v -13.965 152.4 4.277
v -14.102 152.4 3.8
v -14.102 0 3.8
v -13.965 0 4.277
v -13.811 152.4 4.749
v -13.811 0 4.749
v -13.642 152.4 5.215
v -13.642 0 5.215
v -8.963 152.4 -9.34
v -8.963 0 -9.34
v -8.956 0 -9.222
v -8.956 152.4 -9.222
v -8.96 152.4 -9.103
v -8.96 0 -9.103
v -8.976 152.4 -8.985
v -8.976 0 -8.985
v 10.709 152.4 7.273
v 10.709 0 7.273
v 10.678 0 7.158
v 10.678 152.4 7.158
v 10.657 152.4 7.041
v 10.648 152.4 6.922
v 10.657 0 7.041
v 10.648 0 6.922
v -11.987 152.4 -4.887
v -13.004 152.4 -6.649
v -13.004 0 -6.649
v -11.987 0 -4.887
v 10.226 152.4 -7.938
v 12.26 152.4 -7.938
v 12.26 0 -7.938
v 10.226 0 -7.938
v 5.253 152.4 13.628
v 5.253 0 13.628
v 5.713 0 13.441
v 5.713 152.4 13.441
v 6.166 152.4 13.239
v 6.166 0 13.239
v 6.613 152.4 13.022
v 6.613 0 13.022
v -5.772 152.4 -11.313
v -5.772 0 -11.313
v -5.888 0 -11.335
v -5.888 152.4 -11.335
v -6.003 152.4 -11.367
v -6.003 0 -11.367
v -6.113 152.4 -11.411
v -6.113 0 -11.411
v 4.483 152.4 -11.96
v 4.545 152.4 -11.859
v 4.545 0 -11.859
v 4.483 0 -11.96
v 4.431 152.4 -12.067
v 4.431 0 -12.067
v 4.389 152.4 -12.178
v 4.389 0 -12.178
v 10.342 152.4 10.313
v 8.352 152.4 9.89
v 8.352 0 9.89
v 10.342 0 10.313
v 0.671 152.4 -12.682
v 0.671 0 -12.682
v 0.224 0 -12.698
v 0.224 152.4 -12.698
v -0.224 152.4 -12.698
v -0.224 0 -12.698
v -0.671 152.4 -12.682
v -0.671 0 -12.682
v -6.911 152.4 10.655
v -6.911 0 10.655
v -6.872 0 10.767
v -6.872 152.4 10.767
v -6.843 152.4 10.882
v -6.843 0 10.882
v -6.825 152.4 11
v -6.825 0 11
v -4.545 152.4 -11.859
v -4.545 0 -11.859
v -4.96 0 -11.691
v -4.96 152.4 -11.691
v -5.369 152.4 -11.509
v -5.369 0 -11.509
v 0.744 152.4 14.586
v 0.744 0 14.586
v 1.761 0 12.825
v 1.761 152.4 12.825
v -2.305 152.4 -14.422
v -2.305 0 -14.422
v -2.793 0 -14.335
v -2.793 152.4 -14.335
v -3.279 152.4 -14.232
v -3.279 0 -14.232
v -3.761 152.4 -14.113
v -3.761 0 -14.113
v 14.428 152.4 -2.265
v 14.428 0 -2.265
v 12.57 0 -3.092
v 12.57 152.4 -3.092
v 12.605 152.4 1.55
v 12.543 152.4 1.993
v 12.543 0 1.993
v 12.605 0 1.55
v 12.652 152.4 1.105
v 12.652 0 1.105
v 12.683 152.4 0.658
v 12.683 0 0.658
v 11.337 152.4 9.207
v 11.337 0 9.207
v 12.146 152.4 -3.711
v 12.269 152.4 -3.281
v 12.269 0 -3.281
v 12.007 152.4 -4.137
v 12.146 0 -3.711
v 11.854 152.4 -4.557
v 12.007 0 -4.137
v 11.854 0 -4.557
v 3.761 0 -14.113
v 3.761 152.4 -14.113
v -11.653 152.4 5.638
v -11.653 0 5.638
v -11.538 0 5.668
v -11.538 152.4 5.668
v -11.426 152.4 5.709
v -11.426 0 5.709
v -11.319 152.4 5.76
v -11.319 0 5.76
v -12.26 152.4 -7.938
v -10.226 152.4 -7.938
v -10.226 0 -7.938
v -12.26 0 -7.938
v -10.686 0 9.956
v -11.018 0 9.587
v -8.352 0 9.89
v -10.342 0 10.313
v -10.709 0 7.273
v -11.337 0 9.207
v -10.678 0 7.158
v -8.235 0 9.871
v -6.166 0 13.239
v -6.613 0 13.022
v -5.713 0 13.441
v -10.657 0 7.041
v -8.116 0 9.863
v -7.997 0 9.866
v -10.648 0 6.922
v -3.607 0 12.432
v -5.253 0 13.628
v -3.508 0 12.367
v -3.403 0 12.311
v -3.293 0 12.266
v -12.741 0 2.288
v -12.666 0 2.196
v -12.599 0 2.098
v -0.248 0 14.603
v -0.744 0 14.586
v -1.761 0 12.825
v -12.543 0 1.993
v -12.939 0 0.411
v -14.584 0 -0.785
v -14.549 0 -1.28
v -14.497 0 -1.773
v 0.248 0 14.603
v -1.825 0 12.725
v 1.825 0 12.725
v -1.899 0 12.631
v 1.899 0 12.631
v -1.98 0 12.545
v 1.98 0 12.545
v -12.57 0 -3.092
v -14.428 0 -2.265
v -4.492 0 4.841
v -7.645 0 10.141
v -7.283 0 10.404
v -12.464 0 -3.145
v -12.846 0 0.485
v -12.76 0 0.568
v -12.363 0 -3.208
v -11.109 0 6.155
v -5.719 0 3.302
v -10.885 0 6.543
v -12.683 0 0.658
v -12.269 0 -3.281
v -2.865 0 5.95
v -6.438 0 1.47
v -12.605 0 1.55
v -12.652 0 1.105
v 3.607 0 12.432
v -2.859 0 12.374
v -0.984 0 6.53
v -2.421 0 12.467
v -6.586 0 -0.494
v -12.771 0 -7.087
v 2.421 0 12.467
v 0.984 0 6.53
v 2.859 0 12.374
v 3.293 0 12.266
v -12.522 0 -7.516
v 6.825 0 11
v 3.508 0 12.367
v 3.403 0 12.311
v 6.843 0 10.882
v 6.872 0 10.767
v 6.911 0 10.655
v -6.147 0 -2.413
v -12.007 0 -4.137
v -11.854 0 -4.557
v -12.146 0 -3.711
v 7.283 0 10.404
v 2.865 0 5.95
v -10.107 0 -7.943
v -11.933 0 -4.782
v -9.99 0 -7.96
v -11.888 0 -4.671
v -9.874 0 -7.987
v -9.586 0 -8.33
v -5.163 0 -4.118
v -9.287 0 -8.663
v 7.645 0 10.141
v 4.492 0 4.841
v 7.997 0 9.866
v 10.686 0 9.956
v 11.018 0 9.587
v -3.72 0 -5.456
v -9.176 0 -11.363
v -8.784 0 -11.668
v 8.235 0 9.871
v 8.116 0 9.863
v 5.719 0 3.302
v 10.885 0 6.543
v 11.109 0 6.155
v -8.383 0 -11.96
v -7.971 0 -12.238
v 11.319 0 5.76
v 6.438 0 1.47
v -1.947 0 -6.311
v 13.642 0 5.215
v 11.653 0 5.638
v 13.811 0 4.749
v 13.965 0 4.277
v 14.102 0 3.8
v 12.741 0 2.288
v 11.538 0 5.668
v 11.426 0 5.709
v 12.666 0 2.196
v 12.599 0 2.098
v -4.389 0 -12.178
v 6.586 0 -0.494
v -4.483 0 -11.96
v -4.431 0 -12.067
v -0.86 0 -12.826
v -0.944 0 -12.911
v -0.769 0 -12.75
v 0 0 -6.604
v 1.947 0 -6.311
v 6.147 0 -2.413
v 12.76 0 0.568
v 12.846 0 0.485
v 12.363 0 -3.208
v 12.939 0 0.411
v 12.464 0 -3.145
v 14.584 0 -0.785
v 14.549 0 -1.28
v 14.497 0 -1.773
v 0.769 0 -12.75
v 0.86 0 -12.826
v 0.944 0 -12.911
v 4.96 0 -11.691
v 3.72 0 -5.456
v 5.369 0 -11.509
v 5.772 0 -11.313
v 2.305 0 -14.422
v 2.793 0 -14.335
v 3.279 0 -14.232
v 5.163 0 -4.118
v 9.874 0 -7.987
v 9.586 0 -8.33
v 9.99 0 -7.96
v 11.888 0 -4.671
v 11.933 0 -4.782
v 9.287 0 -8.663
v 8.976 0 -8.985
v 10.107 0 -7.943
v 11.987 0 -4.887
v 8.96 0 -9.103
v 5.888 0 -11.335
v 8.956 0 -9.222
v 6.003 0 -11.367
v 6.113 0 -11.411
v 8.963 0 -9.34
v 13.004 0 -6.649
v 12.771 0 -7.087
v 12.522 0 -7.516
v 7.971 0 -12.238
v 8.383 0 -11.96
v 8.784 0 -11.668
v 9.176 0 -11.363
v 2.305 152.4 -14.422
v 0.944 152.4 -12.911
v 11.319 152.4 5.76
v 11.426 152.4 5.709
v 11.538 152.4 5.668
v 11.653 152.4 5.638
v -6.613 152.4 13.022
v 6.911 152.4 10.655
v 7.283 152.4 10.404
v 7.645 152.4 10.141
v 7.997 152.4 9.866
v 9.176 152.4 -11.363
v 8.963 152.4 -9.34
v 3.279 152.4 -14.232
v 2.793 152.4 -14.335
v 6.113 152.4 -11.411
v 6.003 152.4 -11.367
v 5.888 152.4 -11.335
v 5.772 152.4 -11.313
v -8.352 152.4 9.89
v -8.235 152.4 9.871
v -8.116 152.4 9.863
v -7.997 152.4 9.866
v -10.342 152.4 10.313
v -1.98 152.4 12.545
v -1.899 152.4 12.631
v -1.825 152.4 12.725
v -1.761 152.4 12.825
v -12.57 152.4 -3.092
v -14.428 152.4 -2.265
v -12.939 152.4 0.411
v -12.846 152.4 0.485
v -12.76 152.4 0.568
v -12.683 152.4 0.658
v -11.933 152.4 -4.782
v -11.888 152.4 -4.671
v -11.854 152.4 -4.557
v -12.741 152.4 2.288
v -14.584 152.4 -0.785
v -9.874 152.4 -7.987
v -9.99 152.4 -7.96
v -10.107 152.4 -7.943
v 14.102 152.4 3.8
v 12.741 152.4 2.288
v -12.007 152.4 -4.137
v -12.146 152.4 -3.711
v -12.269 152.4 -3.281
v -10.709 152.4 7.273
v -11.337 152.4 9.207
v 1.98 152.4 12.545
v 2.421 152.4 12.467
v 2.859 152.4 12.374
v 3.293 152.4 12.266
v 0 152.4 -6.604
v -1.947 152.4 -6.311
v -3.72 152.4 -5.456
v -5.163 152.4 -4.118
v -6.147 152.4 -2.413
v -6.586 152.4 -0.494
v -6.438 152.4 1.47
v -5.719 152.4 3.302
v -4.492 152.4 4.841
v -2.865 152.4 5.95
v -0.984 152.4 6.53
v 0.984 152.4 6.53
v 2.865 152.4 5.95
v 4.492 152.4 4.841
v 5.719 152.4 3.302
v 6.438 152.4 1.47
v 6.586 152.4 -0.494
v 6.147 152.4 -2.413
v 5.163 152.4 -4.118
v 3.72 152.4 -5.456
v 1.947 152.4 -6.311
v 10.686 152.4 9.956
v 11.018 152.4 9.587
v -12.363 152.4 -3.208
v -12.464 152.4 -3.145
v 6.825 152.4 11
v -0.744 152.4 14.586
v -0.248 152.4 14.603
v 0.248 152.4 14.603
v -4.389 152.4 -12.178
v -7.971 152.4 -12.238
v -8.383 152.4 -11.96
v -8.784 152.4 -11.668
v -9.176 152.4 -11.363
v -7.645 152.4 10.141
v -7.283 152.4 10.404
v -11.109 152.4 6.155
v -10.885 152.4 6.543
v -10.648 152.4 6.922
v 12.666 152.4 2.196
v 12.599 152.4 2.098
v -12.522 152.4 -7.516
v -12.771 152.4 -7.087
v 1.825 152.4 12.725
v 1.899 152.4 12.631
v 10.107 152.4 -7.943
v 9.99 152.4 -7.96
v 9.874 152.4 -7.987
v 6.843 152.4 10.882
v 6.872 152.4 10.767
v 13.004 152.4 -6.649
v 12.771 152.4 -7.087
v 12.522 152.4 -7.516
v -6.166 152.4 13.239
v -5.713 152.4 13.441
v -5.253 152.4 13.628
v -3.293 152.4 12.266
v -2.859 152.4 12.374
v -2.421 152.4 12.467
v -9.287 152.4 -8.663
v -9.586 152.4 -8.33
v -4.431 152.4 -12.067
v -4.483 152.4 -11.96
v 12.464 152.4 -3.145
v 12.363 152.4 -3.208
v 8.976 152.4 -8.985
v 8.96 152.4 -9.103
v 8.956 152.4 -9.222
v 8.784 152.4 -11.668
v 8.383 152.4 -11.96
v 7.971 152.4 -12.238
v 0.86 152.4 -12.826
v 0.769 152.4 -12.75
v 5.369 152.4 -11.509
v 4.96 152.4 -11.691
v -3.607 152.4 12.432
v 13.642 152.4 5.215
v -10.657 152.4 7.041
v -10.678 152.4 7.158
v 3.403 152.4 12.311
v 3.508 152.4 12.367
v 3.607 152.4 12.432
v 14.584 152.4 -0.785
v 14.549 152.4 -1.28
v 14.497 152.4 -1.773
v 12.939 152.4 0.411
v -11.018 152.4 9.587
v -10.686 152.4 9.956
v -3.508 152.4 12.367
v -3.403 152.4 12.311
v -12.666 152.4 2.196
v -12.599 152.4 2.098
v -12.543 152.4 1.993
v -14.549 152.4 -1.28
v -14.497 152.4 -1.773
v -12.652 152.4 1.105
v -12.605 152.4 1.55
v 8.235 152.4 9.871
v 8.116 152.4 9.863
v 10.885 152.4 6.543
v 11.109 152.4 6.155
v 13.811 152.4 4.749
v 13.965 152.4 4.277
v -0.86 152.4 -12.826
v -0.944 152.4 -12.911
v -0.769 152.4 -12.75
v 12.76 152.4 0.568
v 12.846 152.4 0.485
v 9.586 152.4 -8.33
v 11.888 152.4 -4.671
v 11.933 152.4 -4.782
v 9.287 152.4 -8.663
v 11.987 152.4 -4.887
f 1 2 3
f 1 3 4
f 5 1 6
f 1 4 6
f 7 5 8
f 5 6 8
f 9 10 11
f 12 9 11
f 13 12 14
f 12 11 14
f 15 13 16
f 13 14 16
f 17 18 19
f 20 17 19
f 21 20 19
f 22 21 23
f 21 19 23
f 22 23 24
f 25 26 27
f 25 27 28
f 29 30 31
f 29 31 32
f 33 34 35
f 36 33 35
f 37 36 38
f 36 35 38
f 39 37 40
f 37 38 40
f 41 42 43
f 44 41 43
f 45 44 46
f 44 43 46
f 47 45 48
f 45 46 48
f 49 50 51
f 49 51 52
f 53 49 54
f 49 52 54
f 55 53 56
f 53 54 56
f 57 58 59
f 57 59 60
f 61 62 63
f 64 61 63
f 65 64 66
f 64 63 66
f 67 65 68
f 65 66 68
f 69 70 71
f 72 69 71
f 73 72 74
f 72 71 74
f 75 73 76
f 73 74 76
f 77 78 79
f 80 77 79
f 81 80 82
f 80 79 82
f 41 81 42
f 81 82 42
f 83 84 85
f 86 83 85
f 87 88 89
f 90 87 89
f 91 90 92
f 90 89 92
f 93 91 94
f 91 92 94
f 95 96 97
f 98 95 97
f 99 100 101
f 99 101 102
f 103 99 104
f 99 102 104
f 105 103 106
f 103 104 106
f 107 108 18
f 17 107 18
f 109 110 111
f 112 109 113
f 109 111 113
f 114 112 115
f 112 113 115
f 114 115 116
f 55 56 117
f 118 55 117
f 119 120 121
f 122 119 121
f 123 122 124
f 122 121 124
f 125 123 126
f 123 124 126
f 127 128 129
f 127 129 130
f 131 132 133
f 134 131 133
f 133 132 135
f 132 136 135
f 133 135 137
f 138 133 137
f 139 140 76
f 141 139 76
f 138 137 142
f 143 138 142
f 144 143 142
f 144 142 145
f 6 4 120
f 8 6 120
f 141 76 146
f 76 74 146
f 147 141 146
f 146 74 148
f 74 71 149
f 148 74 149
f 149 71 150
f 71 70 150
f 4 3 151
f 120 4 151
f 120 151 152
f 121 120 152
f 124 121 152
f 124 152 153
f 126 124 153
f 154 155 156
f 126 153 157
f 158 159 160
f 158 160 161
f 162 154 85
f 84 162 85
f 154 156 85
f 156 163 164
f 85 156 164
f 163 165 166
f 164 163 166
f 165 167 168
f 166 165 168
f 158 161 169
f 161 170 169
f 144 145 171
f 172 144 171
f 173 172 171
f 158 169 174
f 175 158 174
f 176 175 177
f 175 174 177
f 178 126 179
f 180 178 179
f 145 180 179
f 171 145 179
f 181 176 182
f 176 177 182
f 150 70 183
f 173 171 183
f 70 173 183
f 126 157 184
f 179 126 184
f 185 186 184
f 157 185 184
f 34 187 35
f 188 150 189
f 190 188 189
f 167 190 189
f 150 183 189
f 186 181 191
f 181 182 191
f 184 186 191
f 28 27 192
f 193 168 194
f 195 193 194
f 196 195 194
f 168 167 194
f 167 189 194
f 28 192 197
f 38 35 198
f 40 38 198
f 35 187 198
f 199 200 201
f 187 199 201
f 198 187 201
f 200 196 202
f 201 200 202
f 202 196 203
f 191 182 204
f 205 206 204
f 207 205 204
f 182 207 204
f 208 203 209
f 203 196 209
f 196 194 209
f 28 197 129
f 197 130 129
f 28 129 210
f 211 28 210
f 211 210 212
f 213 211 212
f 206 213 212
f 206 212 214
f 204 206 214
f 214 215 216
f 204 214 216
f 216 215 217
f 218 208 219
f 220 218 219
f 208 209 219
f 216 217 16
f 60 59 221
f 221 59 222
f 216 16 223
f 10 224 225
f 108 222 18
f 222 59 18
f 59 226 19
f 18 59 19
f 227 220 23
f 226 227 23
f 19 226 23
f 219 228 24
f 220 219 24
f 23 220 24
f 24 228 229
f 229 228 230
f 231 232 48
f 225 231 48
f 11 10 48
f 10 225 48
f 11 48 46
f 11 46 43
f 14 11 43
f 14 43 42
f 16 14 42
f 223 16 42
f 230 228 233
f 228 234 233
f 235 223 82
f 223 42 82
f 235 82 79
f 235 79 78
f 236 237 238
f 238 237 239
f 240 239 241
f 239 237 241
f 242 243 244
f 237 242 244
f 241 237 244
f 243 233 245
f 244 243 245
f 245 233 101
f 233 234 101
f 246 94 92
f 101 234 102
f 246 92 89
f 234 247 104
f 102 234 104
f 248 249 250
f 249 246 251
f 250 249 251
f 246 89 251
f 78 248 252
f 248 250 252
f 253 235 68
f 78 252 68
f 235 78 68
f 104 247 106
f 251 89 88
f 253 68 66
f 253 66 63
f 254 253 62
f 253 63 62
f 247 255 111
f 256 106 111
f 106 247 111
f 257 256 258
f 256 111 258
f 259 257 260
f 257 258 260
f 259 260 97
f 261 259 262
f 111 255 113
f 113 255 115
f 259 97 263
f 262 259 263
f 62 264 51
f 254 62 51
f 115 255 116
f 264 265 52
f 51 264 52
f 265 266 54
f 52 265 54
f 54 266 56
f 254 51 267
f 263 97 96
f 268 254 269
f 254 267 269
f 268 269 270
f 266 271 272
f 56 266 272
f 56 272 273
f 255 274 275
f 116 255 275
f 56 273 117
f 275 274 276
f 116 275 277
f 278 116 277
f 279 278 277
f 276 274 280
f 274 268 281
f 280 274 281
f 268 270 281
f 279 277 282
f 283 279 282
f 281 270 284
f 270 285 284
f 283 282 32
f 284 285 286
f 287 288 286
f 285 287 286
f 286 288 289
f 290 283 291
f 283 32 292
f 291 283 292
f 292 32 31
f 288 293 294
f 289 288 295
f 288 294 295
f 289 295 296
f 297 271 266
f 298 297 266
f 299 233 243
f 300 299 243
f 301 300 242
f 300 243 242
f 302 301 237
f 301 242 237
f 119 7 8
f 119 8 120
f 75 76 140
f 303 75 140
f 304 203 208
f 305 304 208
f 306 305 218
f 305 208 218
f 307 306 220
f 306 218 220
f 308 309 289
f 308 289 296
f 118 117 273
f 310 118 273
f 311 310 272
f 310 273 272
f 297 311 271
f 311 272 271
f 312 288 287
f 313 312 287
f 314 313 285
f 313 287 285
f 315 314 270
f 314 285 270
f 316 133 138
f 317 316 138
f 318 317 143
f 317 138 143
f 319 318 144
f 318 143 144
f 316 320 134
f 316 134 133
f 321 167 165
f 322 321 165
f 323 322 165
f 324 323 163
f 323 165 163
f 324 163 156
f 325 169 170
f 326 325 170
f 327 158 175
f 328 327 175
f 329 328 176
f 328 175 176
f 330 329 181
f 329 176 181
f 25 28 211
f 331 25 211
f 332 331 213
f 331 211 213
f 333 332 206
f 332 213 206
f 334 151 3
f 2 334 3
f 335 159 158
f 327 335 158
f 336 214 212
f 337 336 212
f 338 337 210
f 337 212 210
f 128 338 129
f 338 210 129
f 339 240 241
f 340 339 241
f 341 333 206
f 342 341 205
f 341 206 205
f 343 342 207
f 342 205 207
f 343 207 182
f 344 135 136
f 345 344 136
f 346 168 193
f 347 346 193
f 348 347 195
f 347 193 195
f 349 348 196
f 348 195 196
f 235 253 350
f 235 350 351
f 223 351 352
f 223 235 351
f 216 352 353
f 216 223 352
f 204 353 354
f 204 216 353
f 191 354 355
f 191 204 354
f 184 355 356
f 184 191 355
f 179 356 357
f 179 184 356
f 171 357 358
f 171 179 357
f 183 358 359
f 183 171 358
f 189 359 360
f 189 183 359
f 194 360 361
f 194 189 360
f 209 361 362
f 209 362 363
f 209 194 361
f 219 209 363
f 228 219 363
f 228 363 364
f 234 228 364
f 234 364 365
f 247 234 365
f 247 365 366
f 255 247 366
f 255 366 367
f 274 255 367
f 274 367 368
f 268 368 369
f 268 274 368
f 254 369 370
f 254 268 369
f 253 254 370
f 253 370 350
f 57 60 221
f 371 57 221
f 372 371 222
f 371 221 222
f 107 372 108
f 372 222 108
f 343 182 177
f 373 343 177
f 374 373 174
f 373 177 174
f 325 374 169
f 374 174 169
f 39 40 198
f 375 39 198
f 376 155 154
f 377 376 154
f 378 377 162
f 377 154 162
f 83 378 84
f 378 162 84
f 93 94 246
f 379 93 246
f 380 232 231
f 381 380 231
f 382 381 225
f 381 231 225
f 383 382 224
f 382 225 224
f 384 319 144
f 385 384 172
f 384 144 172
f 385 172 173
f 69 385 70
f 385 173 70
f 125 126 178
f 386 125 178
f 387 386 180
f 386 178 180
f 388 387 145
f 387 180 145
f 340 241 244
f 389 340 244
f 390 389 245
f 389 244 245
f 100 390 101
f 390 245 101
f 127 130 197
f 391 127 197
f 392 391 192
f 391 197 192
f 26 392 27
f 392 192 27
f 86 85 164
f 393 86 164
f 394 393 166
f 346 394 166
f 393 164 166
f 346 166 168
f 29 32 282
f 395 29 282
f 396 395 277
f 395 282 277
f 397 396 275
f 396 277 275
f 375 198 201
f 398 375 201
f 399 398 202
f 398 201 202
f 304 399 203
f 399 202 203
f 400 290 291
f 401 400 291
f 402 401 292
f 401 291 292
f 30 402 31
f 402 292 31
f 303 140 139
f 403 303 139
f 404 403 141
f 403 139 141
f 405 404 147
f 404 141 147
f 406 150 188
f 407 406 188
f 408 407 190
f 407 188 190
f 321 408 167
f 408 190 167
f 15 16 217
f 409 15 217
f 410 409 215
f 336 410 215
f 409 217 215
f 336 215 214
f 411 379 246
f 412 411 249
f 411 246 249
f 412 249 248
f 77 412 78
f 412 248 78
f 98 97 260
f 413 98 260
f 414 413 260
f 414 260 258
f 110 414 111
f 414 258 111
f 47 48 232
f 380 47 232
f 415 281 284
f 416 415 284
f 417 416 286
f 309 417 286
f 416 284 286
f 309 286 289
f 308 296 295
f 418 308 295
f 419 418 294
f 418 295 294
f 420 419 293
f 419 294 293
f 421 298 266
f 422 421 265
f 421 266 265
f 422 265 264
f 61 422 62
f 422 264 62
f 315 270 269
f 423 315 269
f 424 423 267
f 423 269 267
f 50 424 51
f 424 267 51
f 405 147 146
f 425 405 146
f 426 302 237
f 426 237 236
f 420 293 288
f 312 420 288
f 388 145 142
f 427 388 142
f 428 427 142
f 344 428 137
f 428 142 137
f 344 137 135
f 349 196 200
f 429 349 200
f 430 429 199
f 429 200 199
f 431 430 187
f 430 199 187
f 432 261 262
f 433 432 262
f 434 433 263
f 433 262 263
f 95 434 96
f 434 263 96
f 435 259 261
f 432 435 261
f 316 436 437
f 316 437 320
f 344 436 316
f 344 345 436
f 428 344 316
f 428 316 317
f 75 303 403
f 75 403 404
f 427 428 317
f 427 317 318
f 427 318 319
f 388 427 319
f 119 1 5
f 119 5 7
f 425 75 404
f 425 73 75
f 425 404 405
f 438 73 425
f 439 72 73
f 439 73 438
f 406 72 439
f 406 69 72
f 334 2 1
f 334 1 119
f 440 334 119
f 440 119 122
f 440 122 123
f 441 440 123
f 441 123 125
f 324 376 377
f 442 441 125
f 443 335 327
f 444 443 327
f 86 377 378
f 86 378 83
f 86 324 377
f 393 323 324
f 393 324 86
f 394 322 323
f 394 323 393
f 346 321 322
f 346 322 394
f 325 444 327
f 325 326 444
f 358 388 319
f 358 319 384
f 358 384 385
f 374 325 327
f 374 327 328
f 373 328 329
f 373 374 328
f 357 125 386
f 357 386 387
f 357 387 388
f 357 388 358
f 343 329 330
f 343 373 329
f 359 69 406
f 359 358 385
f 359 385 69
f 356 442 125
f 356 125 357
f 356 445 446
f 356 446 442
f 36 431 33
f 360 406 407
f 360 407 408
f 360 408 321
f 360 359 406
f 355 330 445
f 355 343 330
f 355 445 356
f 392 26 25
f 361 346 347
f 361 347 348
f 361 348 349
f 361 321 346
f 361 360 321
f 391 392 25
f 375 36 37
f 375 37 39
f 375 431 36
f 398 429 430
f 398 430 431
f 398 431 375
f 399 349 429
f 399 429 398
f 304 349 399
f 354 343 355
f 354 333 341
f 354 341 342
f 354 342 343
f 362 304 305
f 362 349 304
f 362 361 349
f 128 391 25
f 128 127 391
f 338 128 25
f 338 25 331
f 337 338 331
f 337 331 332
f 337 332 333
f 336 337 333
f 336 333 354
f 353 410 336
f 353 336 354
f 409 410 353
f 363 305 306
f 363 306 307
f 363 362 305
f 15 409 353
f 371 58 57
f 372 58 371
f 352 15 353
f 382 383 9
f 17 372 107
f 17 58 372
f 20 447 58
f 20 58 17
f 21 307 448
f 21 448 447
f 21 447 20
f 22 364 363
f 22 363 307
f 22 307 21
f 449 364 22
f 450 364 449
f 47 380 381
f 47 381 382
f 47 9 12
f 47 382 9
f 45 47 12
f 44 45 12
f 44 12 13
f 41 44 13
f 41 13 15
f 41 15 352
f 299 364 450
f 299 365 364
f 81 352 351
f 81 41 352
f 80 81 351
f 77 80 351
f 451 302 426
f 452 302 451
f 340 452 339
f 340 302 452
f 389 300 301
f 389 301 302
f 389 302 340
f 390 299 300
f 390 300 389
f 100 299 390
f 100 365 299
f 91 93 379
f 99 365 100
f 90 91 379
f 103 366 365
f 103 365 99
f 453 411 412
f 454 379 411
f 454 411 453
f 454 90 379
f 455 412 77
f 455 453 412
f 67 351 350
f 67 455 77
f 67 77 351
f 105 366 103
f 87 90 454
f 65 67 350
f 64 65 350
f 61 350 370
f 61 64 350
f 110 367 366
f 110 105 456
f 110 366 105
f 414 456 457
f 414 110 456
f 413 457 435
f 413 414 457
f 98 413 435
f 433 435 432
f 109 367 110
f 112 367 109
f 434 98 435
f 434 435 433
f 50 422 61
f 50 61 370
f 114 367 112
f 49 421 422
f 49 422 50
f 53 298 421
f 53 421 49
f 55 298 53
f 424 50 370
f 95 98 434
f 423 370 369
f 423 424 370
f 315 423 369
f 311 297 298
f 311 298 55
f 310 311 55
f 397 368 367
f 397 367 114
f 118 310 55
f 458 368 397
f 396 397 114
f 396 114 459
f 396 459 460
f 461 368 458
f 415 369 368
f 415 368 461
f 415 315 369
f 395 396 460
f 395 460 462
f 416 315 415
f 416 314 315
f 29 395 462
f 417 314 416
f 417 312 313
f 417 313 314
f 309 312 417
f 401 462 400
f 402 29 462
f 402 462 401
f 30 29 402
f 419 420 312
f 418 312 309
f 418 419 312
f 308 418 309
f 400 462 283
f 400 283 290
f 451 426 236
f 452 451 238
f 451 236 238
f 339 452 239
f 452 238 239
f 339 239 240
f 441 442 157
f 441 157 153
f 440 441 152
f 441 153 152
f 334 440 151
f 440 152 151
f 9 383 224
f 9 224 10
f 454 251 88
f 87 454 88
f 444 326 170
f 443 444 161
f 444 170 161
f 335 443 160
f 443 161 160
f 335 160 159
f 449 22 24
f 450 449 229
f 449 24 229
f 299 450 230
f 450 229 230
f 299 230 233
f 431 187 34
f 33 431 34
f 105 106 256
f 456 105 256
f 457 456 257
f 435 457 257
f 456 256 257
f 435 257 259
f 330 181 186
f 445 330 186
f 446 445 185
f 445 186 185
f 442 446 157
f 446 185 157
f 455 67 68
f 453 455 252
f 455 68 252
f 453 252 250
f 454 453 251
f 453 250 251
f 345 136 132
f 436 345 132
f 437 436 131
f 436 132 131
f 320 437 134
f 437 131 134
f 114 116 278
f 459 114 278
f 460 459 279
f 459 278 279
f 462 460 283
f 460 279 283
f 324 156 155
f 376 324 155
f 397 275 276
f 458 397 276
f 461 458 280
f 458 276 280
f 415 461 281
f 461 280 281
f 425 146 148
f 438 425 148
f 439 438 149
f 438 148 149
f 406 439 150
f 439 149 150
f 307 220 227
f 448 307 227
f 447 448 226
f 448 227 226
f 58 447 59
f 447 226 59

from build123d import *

# Parameters (mm, degrees)
SKETCH1_R           = 6.604
BOSS_EXTRUDE3_DEPTH = 152.4


with BuildPart() as part:
    # Sketch1 → Boss-Extrude3 (new body)
    with BuildSketch(Plane(origin=(0, 0, 0), x_dir=(1, 0, 0), z_dir=(0, 1, 0))):
        with BuildLine():
            Line((-1.761094277, -12.824695235), (-0.744188415, -14.586027856))
            ThreePointArc((-0.744188415, -14.586027856), (0, -14.605), (0.744188415, -14.586027856))
            Line((0.744188415, -14.586027856), (1.761094277, -12.824695235))
            ThreePointArc((1.761094277, -12.824695235), (1.86082516, -12.676971002), (1.980255064, -12.544663801))
            ThreePointArc((1.980255064, -12.544663801), (2.640478473, -12.422474529), (3.293321424, -12.26556293))
            ThreePointArc((3.293321424, -12.26556293), (3.456240258, -12.337855055), (3.607433811, -12.432243652))
            Line((3.607433811, -12.432243652), (5.25282206, -13.62768819))
            ThreePointArc((5.25282206, -13.62768819), (5.940388672, -13.342331409), (6.612521952, -13.022310795))
            Line((6.612521952, -13.022310795), (6.825113166, -10.999640503))
            ThreePointArc((6.825113166, -10.999640503), (6.856137002, -10.824123497), (6.911427462, -10.654678336))
            ThreePointArc((6.911427462, -10.654678336), (7.464872704, -10.274515829), (7.997452719, -9.8656348))
            ThreePointArc((7.997452719, -9.8656348), (8.175690336, -9.865411882), (8.35220382, -9.890144198))
            Line((8.35220382, -9.890144198), (10.34157188, -10.312997433))
            ThreePointArc((10.34157188, -10.312997433), (10.853630176, -9.772652506), (11.33749037, -9.206917894))
            Line((11.33749037, -9.206917894), (10.709007984, -7.272647999))
            ThreePointArc((10.709007984, -7.272647999), (10.66596047, -7.099686705), (10.647551263, -6.922402191))
            ThreePointArc((10.647551263, -6.922402191), (10.998522628, -6.35), (11.318751785, -5.759848786))
            ThreePointArc((11.318751785, -5.759848786), (11.481489281, -5.687149371), (11.652801912, -5.637948964))
            Line((11.652801912, -5.637948964), (13.642169972, -5.215095729))
            ThreePointArc((13.642169972, -5.215095729), (13.89018042, -4.513193203), (14.102103706, -3.799565247))
            Line((14.102103706, -3.799565247), (12.741218033, -2.288148587))
            ThreePointArc((12.741218033, -2.288148587), (12.631542476, -2.147649583), (12.542616721, -1.99317982))
            ThreePointArc((12.542616721, -1.99317982), (12.630428071, -1.327511483), (12.682935839, -0.658132591))
            ThreePointArc((12.682935839, -0.658132591), (12.802034423, -0.525527067), (12.938524691, -0.410901134))
            Line((12.938524691, -0.410901134), (14.58391294, 0.784543404))
            ThreePointArc((14.58391294, 0.784543404), (14.524992282, 1.526638206), (14.428335197, 2.264766749))
            Line((14.428335197, 2.264766749), (12.570355734, 3.091992503))
            ThreePointArc((12.570355734, 3.091992503), (12.413016034, 3.175735662), (12.268949801, 3.280681449))
            ThreePointArc((12.268949801, 3.280681449), (12.078417757, 3.924515829), (11.854125066, 4.557380709))
            ThreePointArc((11.854125066, 4.557380709), (11.908991511, 4.726963641), (11.987059008, 4.887195235))
            Line((11.987059008, 4.887195235), (13.003964871, 6.648527856))
            ThreePointArc((13.003964871, 6.648527856), (12.648301022, 7.3025), (12.259776456, 7.9375))
            Line((12.259776456, 7.9375), (10.22596473, 7.9375))
            ThreePointArc((10.22596473, 7.9375), (10.048166351, 7.950007361), (9.873870001, 7.987283092))
            ThreePointArc((9.873870001, 7.987283092), (9.437939284, 8.497958701), (8.975628378, 8.984881481))
            ThreePointArc((8.975628378, 8.984881481), (8.956775776, 9.162119392), (8.962921923, 9.340251148))
            Line((8.962921923, 9.340251148), (9.175513137, 11.362921441))
            ThreePointArc((9.175513137, 11.362921441), (8.58460361, 11.815693203), (7.971390989, 12.237767391))
            Line((7.971390989, 12.237767391), (6.113411525, 11.410541637))
            ThreePointArc((6.113411525, 11.410541637), (5.945897421, 11.349650564), (5.771508377, 11.312810926))
            ThreePointArc((5.771508377, 11.312810926), (5.165555367, 11.602027312), (4.545164002, 11.85881462))
            ThreePointArc((4.545164002, 11.85881462), (4.455852141, 12.013061465), (4.389014213, 12.178292785))
            Line((4.389014213, 12.178292785), (3.760531826, 14.11256268))
            ThreePointArc((3.760531826, 14.11256268), (3.036550244, 14.285845709), (2.304679602, 14.422013623))
            Line((2.304679602, 14.422013623), (0.943793928, 12.910596963))
            ThreePointArc((0.943793928, 12.910596963), (0.81552881, 12.786836076), (0.671200521, 12.682250978))
            ThreePointArc((0.671200521, 12.682250978), (0, 12.7), (-0.671200521, 12.682250978))
            ThreePointArc((-0.671200521, 12.682250978), (-0.81552881, 12.786836076), (-0.943793928, 12.910596963))
            Line((-0.943793928, 12.910596963), (-2.304679602, 14.422013623))
            ThreePointArc((-2.304679602, 14.422013623), (-3.036550244, 14.285845709), (-3.760531826, 14.11256268))
            Line((-3.760531826, 14.11256268), (-4.389014213, 12.178292785))
            ThreePointArc((-4.389014213, 12.178292785), (-4.455852141, 12.013061465), (-4.545164002, 11.85881462))
            ThreePointArc((-4.545164002, 11.85881462), (-5.165555367, 11.602027312), (-5.771508377, 11.312810926))
            ThreePointArc((-5.771508377, 11.312810926), (-5.945897421, 11.349650564), (-6.113411525, 11.410541637))
            Line((-6.113411525, 11.410541637), (-7.971390989, 12.237767391))
            ThreePointArc((-7.971390989, 12.237767391), (-8.58460361, 11.815693203), (-9.175513137, 11.362921441))
            Line((-9.175513137, 11.362921441), (-8.962921923, 9.340251148))
            ThreePointArc((-8.962921923, 9.340251148), (-8.956775776, 9.162119392), (-8.975628378, 8.984881481))
            ThreePointArc((-8.975628378, 8.984881481), (-9.437939284, 8.497958701), (-9.873870001, 7.987283092))
            ThreePointArc((-9.873870001, 7.987283092), (-10.048166351, 7.950007361), (-10.22596473, 7.9375))
            Line((-10.22596473, 7.9375), (-12.259776456, 7.9375))
            ThreePointArc((-12.259776456, 7.9375), (-12.648301022, 7.3025), (-13.003964871, 6.648527856))
            Line((-13.003964871, 6.648527856), (-11.987059008, 4.887195235))
            ThreePointArc((-11.987059008, 4.887195235), (-11.908991511, 4.726963641), (-11.854125066, 4.557380709))
            ThreePointArc((-11.854125066, 4.557380709), (-12.078417757, 3.924515829), (-12.268949801, 3.280681449))
            ThreePointArc((-12.268949801, 3.280681449), (-12.413016034, 3.175735662), (-12.570355734, 3.091992503))
            Line((-12.570355734, 3.091992503), (-14.428335197, 2.264766749))
            ThreePointArc((-14.428335197, 2.264766749), (-14.524992282, 1.526638206), (-14.58391294, 0.784543404))
            Line((-14.58391294, 0.784543404), (-12.938524691, -0.410901134))
            ThreePointArc((-12.938524691, -0.410901134), (-12.802034423, -0.525527067), (-12.682935839, -0.658132591))
            ThreePointArc((-12.682935839, -0.658132591), (-12.630428071, -1.327511483), (-12.542616721, -1.99317982))
            ThreePointArc((-12.542616721, -1.99317982), (-12.631542476, -2.147649583), (-12.741218033, -2.288148587))
            Line((-12.741218033, -2.288148587), (-14.102103706, -3.799565247))
            ThreePointArc((-14.102103706, -3.799565247), (-13.89018042, -4.513193203), (-13.642169972, -5.215095729))
            Line((-13.642169972, -5.215095729), (-11.652801912, -5.637948964))
            ThreePointArc((-11.652801912, -5.637948964), (-11.481489281, -5.687149371), (-11.318751785, -5.759848786))
            ThreePointArc((-11.318751785, -5.759848786), (-10.998522628, -6.35), (-10.647551263, -6.922402191))
            ThreePointArc((-10.647551263, -6.922402191), (-10.66596047, -7.099686705), (-10.709007984, -7.272647999))
            Line((-10.709007984, -7.272647999), (-11.33749037, -9.206917894))
            ThreePointArc((-11.33749037, -9.206917894), (-10.853630176, -9.772652506), (-10.34157188, -10.312997433))
            Line((-10.34157188, -10.312997433), (-8.35220382, -9.890144198))
            ThreePointArc((-8.35220382, -9.890144198), (-8.175690336, -9.865411882), (-7.997452719, -9.8656348))
            ThreePointArc((-7.997452719, -9.8656348), (-7.464872704, -10.274515829), (-6.911427462, -10.654678336))
            ThreePointArc((-6.911427462, -10.654678336), (-6.856137002, -10.824123497), (-6.825113166, -10.999640503))
            Line((-6.825113166, -10.999640503), (-6.612521952, -13.022310795))
            ThreePointArc((-6.612521952, -13.022310795), (-5.940388672, -13.342331409), (-5.25282206, -13.62768819))
            Line((-5.25282206, -13.62768819), (-3.607433811, -12.432243652))
            ThreePointArc((-3.607433811, -12.432243652), (-3.456240258, -12.337855055), (-3.293321424, -12.26556293))
            ThreePointArc((-3.293321424, -12.26556293), (-2.640478473, -12.422474529), (-1.980255064, -12.544663801))
            ThreePointArc((-1.980255064, -12.544663801), (-1.86082516, -12.676971002), (-1.761094277, -12.824695235))
        make_face()
        with Locations(Location((0, 0, 0), (0, 0, 90))):
            Circle(SKETCH1_R, mode=Mode.SUBTRACT)
    extrude(amount=BOSS_EXTRUDE3_DEPTH)


solid = part.part
